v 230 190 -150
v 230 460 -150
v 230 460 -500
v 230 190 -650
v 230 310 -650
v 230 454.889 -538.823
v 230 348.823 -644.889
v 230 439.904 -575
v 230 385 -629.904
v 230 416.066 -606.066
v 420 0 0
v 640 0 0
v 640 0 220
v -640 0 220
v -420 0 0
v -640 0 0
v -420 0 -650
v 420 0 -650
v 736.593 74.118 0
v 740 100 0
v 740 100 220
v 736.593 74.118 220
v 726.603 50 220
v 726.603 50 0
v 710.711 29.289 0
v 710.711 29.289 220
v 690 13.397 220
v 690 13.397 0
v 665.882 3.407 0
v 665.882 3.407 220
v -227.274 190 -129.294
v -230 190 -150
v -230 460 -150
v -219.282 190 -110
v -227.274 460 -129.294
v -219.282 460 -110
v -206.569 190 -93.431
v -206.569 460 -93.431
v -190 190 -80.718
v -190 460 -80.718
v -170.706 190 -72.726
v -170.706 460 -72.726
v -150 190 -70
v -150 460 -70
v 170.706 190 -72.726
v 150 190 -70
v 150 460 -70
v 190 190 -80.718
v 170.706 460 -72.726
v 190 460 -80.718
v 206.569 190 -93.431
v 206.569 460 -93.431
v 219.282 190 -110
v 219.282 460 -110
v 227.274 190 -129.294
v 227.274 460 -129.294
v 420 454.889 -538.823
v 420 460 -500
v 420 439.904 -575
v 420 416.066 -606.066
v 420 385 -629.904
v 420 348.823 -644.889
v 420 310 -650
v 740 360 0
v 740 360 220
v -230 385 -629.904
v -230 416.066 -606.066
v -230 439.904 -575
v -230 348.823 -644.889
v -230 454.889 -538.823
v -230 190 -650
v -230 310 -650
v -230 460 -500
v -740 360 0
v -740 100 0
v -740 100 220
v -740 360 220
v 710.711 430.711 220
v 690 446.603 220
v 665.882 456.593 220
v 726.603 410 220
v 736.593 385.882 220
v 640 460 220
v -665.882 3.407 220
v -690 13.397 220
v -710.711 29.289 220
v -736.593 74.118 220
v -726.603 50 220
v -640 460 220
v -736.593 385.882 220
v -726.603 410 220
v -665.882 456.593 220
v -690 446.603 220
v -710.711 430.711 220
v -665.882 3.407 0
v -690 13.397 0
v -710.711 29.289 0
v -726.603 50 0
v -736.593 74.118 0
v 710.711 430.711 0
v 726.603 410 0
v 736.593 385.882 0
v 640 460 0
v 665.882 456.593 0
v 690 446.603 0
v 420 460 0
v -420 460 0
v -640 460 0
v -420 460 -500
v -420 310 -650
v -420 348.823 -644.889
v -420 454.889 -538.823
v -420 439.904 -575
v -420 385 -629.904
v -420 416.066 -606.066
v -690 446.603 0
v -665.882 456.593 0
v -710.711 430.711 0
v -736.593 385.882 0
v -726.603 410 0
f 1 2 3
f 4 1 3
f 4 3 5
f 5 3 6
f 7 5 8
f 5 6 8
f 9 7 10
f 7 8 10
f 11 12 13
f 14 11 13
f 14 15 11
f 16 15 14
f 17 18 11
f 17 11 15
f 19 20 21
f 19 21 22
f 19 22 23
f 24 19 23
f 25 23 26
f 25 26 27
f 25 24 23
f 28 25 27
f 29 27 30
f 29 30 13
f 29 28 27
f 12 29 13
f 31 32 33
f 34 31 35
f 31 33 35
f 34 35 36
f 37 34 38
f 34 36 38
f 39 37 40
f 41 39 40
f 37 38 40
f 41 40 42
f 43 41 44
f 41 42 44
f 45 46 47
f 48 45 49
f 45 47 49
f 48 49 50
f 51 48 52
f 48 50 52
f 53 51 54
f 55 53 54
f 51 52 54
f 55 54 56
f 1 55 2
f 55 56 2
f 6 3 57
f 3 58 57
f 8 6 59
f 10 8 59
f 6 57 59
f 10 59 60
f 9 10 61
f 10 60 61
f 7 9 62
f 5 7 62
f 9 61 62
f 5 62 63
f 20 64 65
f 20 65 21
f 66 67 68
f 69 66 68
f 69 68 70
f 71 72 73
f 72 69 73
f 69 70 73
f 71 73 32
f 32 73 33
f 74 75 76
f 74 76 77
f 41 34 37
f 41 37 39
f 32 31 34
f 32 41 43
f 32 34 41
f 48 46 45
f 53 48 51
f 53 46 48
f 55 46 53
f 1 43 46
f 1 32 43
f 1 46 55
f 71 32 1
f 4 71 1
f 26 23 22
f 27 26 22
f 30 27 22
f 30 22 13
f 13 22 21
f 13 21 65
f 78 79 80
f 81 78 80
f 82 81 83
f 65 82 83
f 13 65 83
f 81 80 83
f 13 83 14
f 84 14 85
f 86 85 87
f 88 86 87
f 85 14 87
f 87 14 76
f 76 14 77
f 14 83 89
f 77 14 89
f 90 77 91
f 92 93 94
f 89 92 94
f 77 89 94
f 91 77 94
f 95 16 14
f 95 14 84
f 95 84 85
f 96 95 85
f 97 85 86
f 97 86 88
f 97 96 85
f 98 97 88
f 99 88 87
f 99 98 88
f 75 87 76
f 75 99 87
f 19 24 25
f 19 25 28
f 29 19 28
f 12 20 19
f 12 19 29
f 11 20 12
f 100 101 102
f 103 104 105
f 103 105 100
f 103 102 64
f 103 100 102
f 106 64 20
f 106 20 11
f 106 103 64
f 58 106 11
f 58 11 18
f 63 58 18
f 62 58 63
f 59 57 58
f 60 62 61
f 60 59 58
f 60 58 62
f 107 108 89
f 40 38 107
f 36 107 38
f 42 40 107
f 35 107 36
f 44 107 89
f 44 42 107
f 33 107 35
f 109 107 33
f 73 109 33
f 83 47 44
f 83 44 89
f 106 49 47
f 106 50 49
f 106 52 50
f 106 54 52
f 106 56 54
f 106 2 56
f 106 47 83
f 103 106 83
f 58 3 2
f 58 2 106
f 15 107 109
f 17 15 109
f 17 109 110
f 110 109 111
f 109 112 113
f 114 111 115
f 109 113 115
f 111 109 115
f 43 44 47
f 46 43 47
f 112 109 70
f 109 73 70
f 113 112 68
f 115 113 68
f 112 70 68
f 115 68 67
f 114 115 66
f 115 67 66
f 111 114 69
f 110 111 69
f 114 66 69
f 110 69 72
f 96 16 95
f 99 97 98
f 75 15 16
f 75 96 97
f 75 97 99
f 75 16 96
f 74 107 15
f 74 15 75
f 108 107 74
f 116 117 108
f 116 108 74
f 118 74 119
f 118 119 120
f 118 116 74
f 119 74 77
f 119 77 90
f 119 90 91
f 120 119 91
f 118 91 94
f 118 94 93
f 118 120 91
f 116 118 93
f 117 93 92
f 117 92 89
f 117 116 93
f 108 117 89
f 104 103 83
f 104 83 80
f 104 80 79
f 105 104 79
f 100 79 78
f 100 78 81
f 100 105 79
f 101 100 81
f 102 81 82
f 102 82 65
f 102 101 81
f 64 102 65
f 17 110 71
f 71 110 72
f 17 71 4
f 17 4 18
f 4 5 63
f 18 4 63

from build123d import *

# Parameters (mm, degrees)
Y_KSEKLIK_EKSTR_ZYON1_DEPTH = 220
IZIM2_W                     = 840
IZIM2_H                     = 650
Y_KSEKLIK_EKSTR_ZYON2_DEPTH = 460
KES_EKSTR_ZYON1_DEPTH       = 270
RADYUS2_R                   = 150
RADYUS3_R                   = 150


with BuildPart() as part:
    # Çizim1 → Yükseklik-Ekstrüzyon1 (new body)
    with BuildSketch(Plane.XY):
        with BuildLine():
            Line((-640, 460), (640, 460))
            ThreePointArc((640, 460), (710.710678119, 430.710678119), (740, 360))
            Line((740, 360), (740, 100))
            ThreePointArc((740, 100), (710.710678119, 29.289321881), (640, 0))
            Line((640, 0), (-640, 0))
            ThreePointArc((-640, 0), (-710.710678119, 29.289321881), (-740, 100))
            Line((-740, 100), (-740, 360))
            ThreePointArc((-740, 360), (-710.710678119, 430.710678119), (-640, 460))
        make_face()
    extrude(amount=Y_KSEKLIK_EKSTR_ZYON1_DEPTH)

    # Çizim2 → Yükseklik-Ekstrüzyon2 (add)
    with BuildSketch(Plane(origin=(0, 460, 0), x_dir=(1, 0, 0), z_dir=(0, 1, 0))):
        with Locations((0, 325)):
            Rectangle(IZIM2_W, IZIM2_H)
    extrude(amount=-Y_KSEKLIK_EKSTR_ZYON2_DEPTH)

    # Çizim3 → Kes-Ekstrüzyon1 (cut)
    with BuildSketch(Plane(origin=(0, 460, 0), x_dir=(1, 0, 0), z_dir=(0, 1, 0))):
        with BuildLine():
            Line((0, 70), (0, 650))
            Line((0, 650), (-230, 650))
            Line((-230, 650), (-230, 150))
            ThreePointArc((-230, 150), (-206.568542495, 93.431457505), (-150, 70))
            Line((-150, 70), (0, 70))
        make_face()
        with BuildLine():
            Line((230, 650), (0, 650))
            Line((0, 650), (0, 70))
            Line((0, 70), (150, 70))
            ThreePointArc((150, 70), (206.568542495, 93.431457505), (230, 150))
            Line((230, 150), (230, 650))
        make_face()
    extrude(amount=-KES_EKSTR_ZYON1_DEPTH, mode=Mode.SUBTRACT)

    # Radyus2
    radyus2_edges = [part.edges().sort_by_distance(p)[0] for p in [
        (-325, 460, -650),
    ]]
    fillet(radyus2_edges, radius=RADYUS2_R)

    # Radyus3
    radyus3_edges = [part.edges().sort_by_distance(p)[0] for p in [
        (325, 460, -650),
    ]]
    fillet(radyus3_edges, radius=RADYUS3_R)


solid = part.part
